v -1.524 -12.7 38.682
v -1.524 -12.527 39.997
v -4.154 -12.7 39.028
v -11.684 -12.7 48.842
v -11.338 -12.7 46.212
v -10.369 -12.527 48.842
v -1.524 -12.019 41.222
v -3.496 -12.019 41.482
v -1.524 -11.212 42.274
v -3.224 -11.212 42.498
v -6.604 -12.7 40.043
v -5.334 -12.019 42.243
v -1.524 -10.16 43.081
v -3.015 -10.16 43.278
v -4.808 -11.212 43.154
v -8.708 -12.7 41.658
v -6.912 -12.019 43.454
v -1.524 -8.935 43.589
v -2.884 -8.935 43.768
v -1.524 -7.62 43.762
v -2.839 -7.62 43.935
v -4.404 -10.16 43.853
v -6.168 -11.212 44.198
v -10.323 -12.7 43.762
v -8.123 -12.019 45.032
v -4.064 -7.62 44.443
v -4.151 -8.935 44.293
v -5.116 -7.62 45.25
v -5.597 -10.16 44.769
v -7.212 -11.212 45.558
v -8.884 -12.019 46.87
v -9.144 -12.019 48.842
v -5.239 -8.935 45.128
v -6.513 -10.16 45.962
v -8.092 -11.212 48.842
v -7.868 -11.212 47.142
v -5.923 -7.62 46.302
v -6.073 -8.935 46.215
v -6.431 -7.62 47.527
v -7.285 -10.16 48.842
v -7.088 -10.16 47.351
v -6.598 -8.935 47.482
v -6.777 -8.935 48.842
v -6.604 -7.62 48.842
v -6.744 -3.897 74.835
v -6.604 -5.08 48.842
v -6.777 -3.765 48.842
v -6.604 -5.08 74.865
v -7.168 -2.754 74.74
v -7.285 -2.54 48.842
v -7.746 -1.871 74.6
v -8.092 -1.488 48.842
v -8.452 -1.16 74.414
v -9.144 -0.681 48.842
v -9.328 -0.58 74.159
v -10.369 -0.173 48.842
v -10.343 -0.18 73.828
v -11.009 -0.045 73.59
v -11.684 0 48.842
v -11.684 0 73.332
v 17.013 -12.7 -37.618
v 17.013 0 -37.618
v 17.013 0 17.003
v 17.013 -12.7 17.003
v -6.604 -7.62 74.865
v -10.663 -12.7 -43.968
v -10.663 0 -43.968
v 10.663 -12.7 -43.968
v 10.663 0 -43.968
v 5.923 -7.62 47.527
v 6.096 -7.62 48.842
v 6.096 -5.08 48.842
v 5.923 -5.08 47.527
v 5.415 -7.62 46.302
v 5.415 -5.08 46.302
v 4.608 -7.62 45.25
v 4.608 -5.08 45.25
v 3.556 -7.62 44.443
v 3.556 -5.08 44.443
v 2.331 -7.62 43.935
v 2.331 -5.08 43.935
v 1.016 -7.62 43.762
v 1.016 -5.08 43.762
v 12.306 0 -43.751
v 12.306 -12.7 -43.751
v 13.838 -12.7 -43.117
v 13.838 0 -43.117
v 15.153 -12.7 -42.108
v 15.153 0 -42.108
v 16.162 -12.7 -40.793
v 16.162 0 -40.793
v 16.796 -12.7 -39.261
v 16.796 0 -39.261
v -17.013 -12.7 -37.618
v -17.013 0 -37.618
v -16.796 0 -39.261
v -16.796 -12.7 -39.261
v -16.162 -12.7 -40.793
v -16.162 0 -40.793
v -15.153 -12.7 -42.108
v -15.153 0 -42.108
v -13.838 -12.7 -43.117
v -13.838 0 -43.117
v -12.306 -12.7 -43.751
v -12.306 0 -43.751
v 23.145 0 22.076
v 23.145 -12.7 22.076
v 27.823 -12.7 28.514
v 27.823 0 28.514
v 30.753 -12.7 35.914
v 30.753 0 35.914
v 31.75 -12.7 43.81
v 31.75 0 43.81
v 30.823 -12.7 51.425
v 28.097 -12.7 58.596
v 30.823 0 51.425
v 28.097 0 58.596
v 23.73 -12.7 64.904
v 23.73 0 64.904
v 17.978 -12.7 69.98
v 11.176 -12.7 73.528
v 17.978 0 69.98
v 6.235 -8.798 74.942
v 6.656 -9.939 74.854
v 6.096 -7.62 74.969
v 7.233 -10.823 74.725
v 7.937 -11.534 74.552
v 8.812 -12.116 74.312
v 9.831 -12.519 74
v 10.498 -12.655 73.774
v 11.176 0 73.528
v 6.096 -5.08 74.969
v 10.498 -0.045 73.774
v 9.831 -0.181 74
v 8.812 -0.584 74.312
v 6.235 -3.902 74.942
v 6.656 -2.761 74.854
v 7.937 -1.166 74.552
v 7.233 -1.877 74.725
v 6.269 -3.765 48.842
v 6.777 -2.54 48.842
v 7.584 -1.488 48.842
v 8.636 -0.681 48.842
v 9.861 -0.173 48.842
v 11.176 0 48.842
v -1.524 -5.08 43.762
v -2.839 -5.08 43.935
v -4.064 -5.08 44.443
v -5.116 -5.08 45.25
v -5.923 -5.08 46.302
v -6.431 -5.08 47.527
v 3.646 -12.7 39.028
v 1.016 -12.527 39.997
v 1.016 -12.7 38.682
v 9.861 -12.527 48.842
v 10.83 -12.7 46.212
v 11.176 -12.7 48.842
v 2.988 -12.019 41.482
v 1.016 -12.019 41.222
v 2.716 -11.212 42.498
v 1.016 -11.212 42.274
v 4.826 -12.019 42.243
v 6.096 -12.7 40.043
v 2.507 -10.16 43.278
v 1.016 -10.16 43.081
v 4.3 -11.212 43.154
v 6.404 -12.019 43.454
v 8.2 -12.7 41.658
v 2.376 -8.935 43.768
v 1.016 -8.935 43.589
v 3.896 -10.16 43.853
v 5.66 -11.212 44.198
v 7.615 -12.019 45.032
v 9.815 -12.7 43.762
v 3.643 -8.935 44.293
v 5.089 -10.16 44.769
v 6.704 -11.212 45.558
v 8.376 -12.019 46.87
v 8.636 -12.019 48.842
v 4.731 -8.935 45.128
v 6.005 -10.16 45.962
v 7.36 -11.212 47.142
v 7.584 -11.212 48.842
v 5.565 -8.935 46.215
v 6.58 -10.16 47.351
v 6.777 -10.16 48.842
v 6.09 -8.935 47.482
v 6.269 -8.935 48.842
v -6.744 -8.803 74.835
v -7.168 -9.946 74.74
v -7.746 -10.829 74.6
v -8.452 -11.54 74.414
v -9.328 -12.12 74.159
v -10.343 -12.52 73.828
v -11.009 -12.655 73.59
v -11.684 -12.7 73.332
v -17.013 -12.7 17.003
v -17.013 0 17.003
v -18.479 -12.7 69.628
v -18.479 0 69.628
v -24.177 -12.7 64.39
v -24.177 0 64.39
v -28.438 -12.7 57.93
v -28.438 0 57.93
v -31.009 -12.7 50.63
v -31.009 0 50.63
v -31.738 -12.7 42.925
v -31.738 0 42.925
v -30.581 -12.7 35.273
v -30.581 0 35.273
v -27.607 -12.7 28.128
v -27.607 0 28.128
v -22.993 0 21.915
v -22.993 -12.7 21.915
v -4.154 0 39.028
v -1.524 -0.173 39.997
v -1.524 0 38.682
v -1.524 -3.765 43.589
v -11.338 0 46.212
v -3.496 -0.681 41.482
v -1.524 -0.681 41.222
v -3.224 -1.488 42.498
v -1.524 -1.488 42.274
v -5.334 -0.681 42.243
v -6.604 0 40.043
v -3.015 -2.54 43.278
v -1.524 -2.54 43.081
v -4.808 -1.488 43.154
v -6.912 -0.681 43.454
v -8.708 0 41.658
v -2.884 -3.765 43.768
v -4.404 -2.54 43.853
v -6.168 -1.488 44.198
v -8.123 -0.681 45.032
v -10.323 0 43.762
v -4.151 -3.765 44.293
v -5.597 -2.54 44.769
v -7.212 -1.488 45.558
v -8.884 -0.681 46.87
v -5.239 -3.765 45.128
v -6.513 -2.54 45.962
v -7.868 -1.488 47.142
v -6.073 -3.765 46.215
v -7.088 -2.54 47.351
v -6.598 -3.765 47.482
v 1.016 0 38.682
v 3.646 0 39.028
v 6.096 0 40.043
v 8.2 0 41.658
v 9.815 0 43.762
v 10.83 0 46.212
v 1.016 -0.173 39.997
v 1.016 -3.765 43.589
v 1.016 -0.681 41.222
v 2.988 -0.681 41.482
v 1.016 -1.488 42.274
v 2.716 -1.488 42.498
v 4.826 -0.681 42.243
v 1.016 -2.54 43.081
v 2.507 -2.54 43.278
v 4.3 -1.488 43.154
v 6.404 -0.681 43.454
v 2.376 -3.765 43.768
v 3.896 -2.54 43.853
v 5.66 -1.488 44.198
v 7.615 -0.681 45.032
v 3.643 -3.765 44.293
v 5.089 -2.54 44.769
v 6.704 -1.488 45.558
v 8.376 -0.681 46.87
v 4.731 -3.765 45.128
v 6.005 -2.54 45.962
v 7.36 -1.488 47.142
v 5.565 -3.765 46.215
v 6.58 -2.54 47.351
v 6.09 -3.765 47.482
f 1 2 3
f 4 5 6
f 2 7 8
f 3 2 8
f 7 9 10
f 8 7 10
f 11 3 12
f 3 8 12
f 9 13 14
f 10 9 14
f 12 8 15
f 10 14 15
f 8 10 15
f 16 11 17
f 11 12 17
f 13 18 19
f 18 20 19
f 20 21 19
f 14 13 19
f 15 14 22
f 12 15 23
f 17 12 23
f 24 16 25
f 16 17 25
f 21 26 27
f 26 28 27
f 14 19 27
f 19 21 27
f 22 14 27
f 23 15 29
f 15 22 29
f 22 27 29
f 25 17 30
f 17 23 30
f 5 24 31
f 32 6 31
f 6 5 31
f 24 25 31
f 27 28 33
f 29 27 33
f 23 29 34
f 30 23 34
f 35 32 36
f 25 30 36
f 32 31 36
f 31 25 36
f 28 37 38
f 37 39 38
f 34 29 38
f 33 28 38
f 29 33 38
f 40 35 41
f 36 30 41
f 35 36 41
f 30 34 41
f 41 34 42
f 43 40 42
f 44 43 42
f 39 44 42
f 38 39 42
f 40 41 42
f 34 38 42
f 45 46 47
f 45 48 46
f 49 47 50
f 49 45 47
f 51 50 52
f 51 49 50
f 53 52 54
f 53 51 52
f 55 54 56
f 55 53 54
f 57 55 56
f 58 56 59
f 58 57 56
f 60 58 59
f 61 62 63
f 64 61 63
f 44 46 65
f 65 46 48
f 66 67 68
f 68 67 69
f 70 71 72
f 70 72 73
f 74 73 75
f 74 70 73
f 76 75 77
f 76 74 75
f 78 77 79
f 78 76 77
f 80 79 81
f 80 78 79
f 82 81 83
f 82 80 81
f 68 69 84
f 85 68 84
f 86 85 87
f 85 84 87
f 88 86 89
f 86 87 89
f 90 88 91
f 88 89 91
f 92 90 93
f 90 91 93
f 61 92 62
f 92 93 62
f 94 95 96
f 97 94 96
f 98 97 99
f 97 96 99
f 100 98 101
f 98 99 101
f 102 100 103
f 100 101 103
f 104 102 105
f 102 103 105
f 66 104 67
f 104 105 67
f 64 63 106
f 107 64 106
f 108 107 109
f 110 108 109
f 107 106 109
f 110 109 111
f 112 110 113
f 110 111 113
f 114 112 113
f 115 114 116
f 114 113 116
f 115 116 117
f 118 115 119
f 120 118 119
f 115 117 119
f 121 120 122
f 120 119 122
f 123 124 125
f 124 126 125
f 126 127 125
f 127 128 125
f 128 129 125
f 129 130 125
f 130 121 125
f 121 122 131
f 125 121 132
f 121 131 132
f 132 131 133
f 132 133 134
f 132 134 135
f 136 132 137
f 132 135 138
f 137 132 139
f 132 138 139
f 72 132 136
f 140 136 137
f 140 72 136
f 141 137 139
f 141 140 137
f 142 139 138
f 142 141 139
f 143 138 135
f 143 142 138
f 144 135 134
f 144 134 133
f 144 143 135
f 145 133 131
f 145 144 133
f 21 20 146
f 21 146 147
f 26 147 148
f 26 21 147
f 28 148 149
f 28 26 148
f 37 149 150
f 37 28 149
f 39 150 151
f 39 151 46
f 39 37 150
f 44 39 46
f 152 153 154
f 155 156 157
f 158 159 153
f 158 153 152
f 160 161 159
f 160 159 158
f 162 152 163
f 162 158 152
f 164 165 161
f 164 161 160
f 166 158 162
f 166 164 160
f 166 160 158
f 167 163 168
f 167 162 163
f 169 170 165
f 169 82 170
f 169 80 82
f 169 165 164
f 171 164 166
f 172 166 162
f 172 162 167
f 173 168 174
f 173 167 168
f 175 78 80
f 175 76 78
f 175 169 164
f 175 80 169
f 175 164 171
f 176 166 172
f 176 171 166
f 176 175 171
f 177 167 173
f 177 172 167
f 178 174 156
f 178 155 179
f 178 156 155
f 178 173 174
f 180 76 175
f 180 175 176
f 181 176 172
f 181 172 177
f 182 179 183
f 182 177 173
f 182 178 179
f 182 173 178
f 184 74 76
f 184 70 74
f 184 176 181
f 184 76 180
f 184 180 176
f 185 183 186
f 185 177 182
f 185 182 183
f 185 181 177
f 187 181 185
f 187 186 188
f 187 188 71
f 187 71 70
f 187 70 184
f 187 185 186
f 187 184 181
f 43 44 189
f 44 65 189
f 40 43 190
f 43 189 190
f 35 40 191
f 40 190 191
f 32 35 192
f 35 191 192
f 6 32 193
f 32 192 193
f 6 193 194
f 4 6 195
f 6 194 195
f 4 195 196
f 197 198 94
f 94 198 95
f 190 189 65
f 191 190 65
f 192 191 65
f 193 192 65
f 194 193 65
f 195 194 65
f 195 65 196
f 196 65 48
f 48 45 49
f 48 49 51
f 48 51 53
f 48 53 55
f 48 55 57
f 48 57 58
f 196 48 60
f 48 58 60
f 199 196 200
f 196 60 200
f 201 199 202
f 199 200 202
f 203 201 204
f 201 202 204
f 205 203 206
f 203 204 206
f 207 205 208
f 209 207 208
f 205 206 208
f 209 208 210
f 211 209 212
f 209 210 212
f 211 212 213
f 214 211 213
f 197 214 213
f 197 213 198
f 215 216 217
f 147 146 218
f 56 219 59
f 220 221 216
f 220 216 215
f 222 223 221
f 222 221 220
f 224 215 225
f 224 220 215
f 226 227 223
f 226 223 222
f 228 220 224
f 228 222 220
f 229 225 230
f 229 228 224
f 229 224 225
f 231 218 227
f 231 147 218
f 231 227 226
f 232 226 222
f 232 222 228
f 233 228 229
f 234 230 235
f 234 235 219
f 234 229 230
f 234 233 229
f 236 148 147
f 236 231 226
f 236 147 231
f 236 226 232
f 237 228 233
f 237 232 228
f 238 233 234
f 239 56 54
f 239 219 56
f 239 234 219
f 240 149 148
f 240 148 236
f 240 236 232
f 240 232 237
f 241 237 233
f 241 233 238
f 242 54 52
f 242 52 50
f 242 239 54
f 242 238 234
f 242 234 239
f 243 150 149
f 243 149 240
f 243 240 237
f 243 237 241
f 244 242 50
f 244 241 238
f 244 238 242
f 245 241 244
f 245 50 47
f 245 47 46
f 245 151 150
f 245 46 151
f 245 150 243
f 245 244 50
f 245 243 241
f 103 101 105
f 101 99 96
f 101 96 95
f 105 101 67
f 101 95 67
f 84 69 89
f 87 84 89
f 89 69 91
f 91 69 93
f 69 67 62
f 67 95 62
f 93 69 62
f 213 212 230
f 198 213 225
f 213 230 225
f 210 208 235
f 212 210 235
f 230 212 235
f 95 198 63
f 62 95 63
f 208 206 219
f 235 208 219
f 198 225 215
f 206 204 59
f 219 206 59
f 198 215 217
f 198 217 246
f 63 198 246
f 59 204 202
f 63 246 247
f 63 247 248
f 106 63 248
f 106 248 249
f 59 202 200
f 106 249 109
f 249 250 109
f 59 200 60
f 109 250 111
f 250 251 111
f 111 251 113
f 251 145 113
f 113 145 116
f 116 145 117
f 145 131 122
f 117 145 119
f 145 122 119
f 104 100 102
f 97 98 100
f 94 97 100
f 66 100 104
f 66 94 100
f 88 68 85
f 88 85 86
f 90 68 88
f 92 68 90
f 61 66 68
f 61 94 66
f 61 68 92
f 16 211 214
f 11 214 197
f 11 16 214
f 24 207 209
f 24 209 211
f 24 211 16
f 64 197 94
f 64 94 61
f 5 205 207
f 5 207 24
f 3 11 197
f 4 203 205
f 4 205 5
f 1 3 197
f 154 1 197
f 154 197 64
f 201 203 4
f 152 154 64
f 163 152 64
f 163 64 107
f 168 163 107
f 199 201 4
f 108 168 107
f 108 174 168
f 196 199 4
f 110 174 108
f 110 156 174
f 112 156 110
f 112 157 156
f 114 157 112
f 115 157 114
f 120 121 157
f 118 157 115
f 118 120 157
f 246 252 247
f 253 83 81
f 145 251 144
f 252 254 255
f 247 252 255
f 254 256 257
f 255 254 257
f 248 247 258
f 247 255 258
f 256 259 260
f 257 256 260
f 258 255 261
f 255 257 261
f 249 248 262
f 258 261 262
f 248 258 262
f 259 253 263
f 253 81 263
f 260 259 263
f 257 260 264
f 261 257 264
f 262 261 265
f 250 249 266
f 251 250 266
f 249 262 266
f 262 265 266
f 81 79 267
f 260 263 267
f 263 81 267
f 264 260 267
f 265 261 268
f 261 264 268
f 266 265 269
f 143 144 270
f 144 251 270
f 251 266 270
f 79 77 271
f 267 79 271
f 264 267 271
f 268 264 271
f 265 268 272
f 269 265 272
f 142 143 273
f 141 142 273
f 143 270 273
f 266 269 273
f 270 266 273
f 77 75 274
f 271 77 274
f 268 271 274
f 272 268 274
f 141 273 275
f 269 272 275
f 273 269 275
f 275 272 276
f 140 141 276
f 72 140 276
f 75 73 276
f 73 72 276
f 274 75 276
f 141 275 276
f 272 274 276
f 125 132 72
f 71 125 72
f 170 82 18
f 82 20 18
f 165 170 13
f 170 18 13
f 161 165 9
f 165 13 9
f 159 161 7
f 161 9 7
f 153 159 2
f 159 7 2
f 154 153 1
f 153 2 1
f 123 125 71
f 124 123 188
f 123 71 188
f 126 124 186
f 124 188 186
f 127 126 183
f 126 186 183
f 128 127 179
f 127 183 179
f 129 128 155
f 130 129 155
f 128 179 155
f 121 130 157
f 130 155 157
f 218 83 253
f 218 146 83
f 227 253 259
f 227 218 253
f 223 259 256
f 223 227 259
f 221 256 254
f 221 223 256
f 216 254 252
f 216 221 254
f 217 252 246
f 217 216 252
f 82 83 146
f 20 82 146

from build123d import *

# Parameters (mm, degrees)
F1_DEPTH = 12.7
F2_R     = 5.08


# Not quite as in the source:
# - a feature names something its author has since deleted; it is built from what else it names


with BuildPart() as f1:
    # F0 (on Front) → F1 (new body)
    with BuildSketch(Plane.XZ):
        with BuildLine():
            ThreePointArc((-6.6039999947, 74.8653914212), (-31.2484265209, 49.4310412723), (-17.0128613258, 17.0026184017))
            Line((-17.0128613258, 17.0026184017), (17.0128613258, 17.0026184017))
            ThreePointArc((17.0128613258, 17.0026184017), (27.8228399619, 28.5143091682), (31.75, 43.8098011987))
            ThreePointArc((31.75, 43.8098011987), (24.5113290151, 63.9904168958), (6.0960000053, 74.9690900855))
            Line((6.0960000053, 74.9690900855), (6.0960000053, 62.4722737233))
            Line((6.0960000053, 62.4722737233), (6.0960000053, 43.7620282173))
            Line((6.0960000053, 43.7620282173), (-6.6039999947, 43.7620282173))
            Line((-6.6039999947, 43.7620282173), (-6.6039999947, 62.4722737233))
            Line((-6.6039999947, 62.4722737233), (-6.6039999947, 74.8653914212))
        make_face()
        with BuildLine():
            ThreePointArc((17.0128613258, 17.0026184017), (0, 12.0598011987), (-17.0128613258, 17.0026184017))
            Line((-17.0128613258, 17.0026184017), (-17.0128613258, -37.617602489))
            ThreePointArc((-17.0128613258, -37.617602489), (-15.1529893863, -42.1077305495), (-10.6628613258, -43.967602489))
            Line((-10.6628613258, -43.967602489), (10.6628613258, -43.967602489))
            ThreePointArc((10.6628613258, -43.967602489), (15.1529893863, -42.1077305495), (17.0128613258, -37.617602489))
            Line((17.0128613258, -37.617602489), (17.0128613258, 17.0026184017))
        make_face()
        with BuildLine():
            Line((17.0128613258, 17.0026184017), (-17.0128613258, 17.0026184017))
            ThreePointArc((-17.0128613258, 17.0026184017), (0, 12.0598011987), (17.0128613258, 17.0026184017))
        make_face()
    extrude(amount=F1_DEPTH)

    # F2
    f2_edges = [f1.edges().sort_by_distance(p)[0] for p in [
        (6.096, -6.35, 43.762028),
        (-6.604, -6.35, 43.762028),
        (-0.254, 0, 43.762028),
        (-0.254, -12.7, 43.762028),
        (6.096, 0, 59.365559),
        (6.096, -12.7, 59.365559),
        (-6.604, 0, 59.31371),
        (-6.604, -12.7, 59.31371),
    ]]
    fillet(f2_edges, radius=F2_R)


solid = f1.part
